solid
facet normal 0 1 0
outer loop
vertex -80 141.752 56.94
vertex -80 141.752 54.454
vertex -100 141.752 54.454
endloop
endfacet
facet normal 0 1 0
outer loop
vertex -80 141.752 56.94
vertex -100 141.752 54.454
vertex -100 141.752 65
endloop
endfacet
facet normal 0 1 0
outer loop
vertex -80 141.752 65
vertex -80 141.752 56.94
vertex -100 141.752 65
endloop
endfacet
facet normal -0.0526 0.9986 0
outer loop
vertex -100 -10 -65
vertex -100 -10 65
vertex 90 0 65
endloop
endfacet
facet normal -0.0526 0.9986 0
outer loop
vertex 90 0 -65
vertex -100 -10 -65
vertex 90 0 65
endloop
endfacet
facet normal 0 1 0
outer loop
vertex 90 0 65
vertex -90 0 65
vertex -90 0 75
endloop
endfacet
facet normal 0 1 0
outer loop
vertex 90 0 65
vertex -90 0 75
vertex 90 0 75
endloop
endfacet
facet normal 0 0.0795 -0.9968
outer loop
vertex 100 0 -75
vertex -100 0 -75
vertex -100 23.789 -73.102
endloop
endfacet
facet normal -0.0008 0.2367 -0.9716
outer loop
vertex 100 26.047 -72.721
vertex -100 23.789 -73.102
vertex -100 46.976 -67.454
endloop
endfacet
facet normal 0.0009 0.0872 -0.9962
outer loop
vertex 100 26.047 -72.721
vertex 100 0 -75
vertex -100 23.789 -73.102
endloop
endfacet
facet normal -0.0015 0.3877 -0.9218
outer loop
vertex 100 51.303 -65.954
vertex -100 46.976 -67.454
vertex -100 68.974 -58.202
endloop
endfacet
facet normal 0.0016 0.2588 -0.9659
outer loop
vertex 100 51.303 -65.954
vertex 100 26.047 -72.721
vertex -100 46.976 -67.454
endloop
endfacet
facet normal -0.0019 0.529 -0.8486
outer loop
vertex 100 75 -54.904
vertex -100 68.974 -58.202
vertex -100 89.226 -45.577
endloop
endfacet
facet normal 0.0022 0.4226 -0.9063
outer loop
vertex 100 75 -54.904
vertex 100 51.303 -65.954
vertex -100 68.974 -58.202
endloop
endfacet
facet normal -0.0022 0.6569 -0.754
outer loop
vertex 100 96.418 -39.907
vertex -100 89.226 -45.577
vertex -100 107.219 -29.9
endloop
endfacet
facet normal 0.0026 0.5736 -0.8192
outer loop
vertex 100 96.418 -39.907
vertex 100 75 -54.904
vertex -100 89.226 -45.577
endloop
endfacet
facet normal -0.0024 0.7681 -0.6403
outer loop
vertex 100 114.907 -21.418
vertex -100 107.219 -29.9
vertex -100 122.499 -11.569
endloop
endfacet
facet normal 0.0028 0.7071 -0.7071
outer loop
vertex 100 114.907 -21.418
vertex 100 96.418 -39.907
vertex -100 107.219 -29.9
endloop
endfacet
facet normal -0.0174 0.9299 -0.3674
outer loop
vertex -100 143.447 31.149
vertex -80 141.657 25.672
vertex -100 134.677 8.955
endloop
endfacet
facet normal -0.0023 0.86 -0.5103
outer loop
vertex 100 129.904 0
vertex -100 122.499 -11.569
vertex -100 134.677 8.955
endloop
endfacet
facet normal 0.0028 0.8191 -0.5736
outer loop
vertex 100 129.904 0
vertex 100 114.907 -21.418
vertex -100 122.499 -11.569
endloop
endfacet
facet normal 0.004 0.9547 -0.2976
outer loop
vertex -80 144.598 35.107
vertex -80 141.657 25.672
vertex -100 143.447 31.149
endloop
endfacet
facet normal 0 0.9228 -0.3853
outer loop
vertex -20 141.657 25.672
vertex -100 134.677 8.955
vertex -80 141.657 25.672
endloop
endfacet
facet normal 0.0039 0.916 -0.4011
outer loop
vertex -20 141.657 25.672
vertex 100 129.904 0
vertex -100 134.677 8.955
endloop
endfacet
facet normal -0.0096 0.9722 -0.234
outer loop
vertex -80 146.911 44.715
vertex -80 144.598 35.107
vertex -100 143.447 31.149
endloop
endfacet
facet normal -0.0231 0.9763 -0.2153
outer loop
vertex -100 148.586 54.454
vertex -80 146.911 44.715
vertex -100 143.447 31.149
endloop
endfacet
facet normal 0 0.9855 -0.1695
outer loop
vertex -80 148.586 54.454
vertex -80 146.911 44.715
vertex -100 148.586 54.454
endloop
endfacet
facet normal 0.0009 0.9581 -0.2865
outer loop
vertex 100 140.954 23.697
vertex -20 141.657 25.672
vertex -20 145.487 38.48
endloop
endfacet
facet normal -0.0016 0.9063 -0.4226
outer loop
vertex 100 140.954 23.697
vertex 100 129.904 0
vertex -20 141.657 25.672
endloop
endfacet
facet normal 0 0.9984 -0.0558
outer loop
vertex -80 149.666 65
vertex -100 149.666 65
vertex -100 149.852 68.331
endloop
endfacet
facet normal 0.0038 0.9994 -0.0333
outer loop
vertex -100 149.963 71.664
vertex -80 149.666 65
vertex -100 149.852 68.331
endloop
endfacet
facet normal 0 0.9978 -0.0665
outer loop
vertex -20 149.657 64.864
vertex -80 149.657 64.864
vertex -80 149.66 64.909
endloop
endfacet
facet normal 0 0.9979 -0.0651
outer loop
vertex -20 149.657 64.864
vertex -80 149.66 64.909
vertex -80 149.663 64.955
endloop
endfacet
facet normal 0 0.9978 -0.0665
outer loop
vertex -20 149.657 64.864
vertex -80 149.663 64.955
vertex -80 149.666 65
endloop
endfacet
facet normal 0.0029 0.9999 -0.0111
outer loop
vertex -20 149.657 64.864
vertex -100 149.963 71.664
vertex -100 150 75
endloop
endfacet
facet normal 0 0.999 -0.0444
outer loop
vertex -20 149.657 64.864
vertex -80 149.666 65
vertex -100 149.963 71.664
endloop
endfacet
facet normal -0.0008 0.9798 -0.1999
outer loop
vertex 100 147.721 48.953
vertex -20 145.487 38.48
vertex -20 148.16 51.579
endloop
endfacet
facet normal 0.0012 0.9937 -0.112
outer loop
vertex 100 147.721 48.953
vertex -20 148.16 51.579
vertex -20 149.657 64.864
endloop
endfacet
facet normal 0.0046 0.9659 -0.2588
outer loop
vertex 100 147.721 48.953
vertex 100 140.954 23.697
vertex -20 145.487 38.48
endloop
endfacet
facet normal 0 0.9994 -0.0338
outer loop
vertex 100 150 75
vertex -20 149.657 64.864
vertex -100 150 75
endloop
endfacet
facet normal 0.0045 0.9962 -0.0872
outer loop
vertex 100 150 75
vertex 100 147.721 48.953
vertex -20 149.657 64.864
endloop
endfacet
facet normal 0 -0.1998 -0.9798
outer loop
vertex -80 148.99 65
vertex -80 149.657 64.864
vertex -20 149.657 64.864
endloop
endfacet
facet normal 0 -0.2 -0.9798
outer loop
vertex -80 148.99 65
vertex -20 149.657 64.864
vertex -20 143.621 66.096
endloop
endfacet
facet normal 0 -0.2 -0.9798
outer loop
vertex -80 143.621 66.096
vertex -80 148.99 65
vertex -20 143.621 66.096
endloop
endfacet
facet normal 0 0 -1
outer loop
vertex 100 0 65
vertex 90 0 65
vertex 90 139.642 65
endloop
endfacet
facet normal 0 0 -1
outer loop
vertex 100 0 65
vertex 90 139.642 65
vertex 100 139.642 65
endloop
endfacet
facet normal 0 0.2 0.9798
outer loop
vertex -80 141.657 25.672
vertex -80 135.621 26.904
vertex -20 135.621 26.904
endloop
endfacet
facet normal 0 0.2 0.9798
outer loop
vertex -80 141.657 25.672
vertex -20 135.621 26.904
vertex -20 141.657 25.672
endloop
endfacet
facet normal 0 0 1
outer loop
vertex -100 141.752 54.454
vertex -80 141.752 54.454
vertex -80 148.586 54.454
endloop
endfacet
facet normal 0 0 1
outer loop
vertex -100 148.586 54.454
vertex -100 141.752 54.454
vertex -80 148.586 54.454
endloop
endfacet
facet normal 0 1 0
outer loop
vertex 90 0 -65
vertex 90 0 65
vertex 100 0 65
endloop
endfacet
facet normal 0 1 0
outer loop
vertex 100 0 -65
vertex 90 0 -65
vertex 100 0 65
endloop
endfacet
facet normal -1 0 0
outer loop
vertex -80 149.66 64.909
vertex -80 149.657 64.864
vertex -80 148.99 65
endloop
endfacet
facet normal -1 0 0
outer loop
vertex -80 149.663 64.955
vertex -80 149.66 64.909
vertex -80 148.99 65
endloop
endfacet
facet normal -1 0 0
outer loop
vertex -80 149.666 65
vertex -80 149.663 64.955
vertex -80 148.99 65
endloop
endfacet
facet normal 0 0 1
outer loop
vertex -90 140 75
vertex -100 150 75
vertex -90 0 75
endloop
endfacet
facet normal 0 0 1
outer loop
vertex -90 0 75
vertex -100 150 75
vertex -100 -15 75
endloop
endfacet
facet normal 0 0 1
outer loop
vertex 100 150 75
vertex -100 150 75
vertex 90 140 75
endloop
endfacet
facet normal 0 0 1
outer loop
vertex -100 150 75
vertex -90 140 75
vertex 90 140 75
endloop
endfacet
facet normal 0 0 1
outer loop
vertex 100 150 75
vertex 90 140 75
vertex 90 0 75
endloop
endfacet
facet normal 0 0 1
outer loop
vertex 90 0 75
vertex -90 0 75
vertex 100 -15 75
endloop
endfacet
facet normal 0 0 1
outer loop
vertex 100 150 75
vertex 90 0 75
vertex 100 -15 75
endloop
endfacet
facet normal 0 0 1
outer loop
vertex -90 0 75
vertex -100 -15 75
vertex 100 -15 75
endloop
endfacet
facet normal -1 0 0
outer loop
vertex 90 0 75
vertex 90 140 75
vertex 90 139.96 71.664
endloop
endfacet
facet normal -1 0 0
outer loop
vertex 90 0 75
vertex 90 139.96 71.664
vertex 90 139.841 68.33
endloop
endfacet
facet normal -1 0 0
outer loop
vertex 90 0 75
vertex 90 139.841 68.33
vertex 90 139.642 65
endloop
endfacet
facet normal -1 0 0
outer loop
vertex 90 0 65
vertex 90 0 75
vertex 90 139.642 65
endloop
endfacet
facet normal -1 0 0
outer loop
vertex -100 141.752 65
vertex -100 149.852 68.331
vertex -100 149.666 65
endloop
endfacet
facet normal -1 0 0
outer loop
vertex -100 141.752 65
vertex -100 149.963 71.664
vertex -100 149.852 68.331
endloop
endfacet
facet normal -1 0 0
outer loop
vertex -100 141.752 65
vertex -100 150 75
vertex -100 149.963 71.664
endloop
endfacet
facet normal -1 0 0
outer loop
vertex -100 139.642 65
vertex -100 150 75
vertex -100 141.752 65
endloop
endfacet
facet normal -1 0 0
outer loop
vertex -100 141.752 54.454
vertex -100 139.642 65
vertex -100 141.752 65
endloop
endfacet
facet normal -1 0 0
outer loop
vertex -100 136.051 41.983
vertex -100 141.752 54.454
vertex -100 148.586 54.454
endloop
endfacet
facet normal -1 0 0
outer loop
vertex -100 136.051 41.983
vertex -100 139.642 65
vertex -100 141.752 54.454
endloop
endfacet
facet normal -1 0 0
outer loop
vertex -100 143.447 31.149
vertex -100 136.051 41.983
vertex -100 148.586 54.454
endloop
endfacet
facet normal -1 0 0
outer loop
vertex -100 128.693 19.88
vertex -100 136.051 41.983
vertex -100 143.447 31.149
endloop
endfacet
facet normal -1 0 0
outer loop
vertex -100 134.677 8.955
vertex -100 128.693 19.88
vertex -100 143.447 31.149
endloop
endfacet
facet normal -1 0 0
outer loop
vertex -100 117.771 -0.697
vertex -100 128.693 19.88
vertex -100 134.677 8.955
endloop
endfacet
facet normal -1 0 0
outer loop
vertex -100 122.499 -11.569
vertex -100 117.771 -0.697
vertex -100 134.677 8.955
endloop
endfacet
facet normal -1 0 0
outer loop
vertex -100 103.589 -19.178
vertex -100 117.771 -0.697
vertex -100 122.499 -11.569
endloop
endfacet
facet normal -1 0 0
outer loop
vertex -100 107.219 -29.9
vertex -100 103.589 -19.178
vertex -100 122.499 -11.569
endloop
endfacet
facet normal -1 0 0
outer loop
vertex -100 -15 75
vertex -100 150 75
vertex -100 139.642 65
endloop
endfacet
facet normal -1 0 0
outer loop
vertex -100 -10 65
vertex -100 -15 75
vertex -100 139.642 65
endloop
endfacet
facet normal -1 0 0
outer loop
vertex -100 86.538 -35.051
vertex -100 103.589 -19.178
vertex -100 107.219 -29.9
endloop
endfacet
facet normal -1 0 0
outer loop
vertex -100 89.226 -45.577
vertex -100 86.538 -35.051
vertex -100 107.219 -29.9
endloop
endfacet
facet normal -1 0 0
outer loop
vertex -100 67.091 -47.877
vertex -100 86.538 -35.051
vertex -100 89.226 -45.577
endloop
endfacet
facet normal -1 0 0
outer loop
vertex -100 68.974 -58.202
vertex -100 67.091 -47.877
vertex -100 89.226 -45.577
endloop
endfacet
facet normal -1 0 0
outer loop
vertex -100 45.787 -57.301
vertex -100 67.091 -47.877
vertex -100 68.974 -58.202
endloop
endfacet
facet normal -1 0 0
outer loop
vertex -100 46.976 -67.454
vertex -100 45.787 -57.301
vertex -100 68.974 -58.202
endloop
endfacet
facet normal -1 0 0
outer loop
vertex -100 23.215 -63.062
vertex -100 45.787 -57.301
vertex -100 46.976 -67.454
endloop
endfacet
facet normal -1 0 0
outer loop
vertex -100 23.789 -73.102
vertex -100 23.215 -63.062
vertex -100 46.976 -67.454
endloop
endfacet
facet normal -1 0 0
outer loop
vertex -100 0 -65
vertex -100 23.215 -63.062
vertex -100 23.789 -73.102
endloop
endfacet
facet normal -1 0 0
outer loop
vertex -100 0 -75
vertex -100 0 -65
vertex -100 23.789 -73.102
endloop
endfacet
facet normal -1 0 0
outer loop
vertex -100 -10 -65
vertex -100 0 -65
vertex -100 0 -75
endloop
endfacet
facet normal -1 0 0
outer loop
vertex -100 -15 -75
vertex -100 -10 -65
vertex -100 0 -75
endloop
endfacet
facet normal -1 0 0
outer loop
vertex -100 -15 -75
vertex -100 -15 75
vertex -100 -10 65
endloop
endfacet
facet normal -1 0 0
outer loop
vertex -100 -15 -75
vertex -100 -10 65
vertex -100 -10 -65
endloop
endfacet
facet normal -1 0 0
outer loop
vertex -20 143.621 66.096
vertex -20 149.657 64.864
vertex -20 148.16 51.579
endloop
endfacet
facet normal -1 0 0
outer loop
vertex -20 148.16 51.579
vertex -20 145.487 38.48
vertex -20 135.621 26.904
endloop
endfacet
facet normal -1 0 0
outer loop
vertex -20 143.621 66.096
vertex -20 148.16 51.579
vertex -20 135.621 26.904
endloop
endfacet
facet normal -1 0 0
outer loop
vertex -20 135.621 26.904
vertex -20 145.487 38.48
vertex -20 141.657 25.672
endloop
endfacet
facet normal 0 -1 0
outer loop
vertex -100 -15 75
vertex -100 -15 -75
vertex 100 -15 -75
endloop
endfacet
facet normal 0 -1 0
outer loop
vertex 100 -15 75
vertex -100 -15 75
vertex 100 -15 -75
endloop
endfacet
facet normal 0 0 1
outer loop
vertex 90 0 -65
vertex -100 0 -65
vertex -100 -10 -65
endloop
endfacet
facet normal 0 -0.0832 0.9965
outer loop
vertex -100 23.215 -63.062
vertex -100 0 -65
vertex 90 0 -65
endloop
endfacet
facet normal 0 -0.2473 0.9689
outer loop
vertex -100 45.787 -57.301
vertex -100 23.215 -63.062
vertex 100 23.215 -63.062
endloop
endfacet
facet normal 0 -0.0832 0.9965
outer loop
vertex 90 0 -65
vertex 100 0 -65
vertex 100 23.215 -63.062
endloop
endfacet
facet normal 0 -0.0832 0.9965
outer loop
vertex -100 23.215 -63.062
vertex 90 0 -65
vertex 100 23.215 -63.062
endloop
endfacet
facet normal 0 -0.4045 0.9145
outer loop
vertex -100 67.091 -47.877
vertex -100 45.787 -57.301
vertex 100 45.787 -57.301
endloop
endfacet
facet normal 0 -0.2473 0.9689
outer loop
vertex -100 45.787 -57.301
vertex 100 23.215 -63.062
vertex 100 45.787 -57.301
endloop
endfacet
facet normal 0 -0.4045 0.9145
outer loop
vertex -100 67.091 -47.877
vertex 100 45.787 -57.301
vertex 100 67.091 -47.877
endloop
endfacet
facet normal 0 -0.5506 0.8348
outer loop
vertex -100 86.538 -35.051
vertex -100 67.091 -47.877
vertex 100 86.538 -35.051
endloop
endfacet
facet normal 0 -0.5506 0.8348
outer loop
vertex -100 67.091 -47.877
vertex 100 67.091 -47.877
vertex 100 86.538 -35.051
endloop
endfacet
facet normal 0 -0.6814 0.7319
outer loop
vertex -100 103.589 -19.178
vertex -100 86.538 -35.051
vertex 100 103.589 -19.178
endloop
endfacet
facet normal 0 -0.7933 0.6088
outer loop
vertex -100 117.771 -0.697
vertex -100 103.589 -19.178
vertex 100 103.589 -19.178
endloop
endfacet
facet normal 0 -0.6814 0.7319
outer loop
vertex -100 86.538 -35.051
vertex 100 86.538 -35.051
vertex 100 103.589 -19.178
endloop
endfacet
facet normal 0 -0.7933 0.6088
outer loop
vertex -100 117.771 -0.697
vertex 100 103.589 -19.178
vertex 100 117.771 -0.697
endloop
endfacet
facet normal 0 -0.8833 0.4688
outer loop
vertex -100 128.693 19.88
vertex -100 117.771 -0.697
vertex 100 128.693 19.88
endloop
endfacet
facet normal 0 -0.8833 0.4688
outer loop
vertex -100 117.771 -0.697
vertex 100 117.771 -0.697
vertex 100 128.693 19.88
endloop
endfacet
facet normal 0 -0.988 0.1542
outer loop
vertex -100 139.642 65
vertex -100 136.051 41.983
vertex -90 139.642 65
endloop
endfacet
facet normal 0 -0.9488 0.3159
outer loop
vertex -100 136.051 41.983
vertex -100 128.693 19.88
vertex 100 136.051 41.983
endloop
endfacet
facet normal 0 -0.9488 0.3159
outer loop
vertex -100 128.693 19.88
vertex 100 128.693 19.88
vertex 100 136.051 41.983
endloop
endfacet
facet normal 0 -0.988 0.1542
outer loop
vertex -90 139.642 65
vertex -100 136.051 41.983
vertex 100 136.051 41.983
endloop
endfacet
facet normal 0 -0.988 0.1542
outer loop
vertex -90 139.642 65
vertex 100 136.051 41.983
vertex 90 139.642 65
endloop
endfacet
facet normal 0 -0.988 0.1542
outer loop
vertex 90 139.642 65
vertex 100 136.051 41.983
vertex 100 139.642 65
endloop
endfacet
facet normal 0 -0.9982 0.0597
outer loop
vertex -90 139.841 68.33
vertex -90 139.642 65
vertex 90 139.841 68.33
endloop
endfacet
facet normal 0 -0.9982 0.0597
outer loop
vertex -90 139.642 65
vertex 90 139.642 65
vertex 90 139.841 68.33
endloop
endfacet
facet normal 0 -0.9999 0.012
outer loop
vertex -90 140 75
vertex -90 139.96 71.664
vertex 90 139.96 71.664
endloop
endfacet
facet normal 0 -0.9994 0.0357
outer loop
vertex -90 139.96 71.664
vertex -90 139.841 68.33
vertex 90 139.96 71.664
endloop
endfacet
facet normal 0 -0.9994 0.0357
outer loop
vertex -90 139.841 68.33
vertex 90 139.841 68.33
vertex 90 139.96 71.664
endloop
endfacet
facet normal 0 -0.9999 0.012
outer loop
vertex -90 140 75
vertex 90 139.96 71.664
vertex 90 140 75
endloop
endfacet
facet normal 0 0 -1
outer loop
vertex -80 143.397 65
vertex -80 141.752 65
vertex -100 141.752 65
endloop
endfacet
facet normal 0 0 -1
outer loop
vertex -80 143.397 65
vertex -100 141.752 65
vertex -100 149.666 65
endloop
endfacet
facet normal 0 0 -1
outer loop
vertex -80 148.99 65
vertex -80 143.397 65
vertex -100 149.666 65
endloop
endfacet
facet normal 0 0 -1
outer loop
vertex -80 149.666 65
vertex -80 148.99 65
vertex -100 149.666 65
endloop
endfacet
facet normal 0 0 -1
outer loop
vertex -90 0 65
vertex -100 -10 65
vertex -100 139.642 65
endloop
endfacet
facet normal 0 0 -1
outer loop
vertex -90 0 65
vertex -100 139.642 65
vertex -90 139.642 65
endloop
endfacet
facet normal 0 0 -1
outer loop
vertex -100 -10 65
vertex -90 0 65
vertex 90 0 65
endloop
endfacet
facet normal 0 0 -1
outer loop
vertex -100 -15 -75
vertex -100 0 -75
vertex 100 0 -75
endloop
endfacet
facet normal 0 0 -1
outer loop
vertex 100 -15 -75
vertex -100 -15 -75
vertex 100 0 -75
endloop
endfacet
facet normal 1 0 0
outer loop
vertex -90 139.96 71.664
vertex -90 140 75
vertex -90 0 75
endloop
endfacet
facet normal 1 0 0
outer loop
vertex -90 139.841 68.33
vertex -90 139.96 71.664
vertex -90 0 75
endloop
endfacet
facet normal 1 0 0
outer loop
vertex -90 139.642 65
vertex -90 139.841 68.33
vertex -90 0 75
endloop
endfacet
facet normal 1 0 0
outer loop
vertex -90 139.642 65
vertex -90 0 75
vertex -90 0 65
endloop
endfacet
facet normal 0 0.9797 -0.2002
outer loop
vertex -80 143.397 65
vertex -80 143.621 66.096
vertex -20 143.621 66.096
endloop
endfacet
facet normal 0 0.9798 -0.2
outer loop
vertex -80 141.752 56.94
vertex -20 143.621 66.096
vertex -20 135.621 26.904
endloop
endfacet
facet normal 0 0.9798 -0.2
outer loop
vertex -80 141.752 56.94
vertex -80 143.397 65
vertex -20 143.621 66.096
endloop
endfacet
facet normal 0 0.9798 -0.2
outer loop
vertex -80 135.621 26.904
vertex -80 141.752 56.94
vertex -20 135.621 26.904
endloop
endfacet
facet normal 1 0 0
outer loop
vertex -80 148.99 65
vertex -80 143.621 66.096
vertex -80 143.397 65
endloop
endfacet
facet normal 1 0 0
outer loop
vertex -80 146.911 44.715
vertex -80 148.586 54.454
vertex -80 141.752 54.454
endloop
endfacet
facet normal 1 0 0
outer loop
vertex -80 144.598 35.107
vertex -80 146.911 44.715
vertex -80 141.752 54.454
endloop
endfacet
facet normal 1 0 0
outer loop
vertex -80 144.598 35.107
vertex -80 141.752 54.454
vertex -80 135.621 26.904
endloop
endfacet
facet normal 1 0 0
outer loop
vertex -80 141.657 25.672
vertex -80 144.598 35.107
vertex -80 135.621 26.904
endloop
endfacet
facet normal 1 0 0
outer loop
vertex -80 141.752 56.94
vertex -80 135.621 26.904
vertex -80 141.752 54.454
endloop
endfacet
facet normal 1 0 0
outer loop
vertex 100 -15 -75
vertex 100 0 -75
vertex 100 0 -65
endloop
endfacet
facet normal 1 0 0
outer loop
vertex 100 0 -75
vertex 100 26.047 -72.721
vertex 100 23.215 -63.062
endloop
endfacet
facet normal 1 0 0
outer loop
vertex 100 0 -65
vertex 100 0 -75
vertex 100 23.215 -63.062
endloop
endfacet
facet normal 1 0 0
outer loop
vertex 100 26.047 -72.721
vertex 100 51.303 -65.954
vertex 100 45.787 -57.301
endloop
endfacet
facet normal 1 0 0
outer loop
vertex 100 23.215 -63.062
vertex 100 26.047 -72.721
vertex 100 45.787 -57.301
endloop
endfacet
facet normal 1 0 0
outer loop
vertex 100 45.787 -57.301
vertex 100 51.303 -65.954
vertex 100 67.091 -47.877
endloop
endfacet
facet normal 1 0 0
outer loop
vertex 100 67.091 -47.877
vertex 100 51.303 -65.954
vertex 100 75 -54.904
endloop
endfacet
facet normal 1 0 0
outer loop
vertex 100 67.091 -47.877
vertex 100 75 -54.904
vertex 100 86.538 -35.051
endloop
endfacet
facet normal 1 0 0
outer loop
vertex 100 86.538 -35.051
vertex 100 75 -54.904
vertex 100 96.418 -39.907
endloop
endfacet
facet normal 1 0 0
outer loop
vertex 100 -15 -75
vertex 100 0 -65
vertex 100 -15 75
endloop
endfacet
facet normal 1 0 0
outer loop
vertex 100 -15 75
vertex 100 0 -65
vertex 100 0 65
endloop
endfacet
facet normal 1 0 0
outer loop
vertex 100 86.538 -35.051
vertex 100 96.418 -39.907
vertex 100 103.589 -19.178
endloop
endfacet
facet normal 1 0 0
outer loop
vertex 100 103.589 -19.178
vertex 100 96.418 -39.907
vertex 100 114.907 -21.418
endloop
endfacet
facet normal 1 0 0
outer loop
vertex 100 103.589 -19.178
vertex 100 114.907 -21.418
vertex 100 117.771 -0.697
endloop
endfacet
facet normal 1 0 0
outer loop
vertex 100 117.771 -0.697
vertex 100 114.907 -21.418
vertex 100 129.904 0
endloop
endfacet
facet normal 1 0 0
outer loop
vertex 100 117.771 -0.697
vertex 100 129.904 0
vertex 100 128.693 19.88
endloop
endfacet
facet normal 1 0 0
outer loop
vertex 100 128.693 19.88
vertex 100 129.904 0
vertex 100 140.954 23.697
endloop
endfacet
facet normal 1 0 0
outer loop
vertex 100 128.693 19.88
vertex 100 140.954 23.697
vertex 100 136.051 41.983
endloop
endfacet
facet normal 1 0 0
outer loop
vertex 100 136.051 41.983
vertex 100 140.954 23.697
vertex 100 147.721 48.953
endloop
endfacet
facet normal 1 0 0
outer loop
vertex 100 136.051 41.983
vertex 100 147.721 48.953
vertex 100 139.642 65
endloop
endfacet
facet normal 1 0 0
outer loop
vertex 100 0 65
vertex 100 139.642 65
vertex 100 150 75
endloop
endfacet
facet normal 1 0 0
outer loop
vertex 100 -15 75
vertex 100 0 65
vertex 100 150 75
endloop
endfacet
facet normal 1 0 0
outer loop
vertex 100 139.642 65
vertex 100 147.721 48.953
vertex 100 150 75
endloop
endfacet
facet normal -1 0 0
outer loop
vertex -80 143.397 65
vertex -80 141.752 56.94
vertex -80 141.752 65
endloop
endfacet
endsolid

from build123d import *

# Parameters (mm, degrees)
SKETCH1_W                = 200
SKETCH1_H                = 150
BOSS_EXTRUDE1_DEPTH      = 15
SKETCH1_5_W              = 200
SKETCH1_5_H              = 10
REVOLVE1_ANGLE           = 90
BOSS_EXTRUDE3_REACH      = 197.256
BOSS_EXTRUDE3_END_RADIUS = 140
SKETCH1_6_W              = 10
SKETCH1_6_H              = 10
CUT_EXTRUDE1_DEPTH       = 130
CUT_EXTRUDE2_DEPTH       = 60
SKETCH7_W                = 10.545965087
SKETCH7_H                = 8.248079899
CUT_EXTRUDE5_DEPTH       = 74


with BuildPart() as part:
    # Sketch1 → Boss-Extrude1 (new body)
    with BuildSketch(Plane(origin=(0, 0, 0), x_dir=(1, 0, 0), z_dir=(0, 1, 0))):
        Rectangle(SKETCH1_W, SKETCH1_H)
    extrude(amount=-BOSS_EXTRUDE1_DEPTH)

    # Sketch1<5> → Revolve1 (revolve)
    with BuildSketch(Plane(origin=(0, 0, 0), x_dir=(1, 0, 0), z_dir=(0, 1, 0))):
        with Locations((0, 70)):
            Rectangle(SKETCH1_5_W, SKETCH1_5_H)
    revolve(axis=Axis((-100, 0, 75), (1, 0, 0)), revolution_arc=REVOLVE1_ANGLE)

    # Boss-Extrude3: up to this cylinder (the profile starts inside it)
    boss_extrude3_end = Plane(origin=(0, 0, 75), z_dir=(-1, 0, 0)) * Cylinder(BOSS_EXTRUDE3_END_RADIUS, 865.512, mode=Mode.PRIVATE)
    # Sketch1<6> → Boss-Extrude3 (add, up to the surface)
    with BuildSketch(Plane(origin=(0, 0, 0), x_dir=(1, 0, 0), z_dir=(0, 1, 0)), mode=Mode.PRIVATE) as boss_extrude3_sk1:
        with Locations((-95, -70)):
            Rectangle(SKETCH1_6_W, SKETCH1_6_H)
    boss_extrude3_tool1 = extrude(boss_extrude3_sk1.sketch, amount=BOSS_EXTRUDE3_REACH, mode=Mode.PRIVATE) & boss_extrude3_end
    add(boss_extrude3_tool1.solids().sort_by_distance((-95, 0, 70))[0])
    # Sketch1<6> → Boss-Extrude3 (add, up to the surface)
    with BuildSketch(Plane(origin=(0, 0, 0), x_dir=(1, 0, 0), z_dir=(0, 1, 0)), mode=Mode.PRIVATE) as boss_extrude3_sk2:
        with Locations((95, -70)):
            Rectangle(SKETCH1_6_W, SKETCH1_6_H)
    boss_extrude3_tool2 = extrude(boss_extrude3_sk2.sketch, amount=BOSS_EXTRUDE3_REACH, mode=Mode.PRIVATE) & boss_extrude3_end
    add(boss_extrude3_tool2.solids().sort_by_distance((95, 0, 70))[0])

    # Sketch4 → Cut-Extrude1 (cut)
    with BuildSketch(Plane.XY.offset(65)):
        Polygon((-100, -10), (90, 0), (-100, 0), align=None)
    extrude(amount=-CUT_EXTRUDE1_DEPTH, mode=Mode.SUBTRACT)

    # Sketch5 → Cut-Extrude2 (cut)
    with BuildSketch(Plane.ZY.offset(80)):
        Polygon((66.095917942, 143.620915339), (26.904082058, 135.620915339), (21.904082058, 160.115812766), (61.095917942, 168.115812766), align=None)
    extrude(amount=-CUT_EXTRUDE2_DEPTH, mode=Mode.SUBTRACT)

    # Sketch7 → Cut-Extrude5 (cut)
    with BuildSketch(Plane.ZY.offset(80)):
        with Locations((59.727017457, 145.87596005)):
            Rectangle(SKETCH7_W, SKETCH7_H)
    extrude(amount=CUT_EXTRUDE5_DEPTH, mode=Mode.SUBTRACT)


solid = part.part
